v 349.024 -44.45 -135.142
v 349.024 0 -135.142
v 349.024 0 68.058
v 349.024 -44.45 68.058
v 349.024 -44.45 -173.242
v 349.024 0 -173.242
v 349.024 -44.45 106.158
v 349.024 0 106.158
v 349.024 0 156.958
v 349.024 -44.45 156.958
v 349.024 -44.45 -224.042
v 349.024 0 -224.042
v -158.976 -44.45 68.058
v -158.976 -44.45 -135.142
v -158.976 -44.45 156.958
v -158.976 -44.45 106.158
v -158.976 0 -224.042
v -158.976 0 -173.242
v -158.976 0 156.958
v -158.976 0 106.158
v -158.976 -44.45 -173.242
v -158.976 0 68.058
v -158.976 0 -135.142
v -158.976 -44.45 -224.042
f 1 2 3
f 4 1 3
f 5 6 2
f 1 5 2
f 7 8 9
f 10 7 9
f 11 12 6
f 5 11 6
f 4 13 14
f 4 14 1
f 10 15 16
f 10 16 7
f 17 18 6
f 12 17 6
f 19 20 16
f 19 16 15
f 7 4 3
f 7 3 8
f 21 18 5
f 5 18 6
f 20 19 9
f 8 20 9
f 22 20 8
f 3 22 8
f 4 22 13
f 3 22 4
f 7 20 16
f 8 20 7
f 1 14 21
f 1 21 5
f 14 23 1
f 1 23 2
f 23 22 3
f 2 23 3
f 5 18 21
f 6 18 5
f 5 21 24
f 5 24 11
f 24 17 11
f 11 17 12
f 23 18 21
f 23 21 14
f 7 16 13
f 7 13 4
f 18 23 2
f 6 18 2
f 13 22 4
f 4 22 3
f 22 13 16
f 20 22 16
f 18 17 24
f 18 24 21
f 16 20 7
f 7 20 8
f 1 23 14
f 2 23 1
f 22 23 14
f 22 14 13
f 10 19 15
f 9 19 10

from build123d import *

# Parameters (mm, degrees)
F0_W     = 508
F0_H     = 38.1
F1_DEPTH = 44.45
F2_DEPTH = 44.45
F0_H_2   = 203.2
F0_H_3   = 50.8
F3_DEPTH = 44.45


with BuildPart() as f1:
    # F0 (on Front) → F1 (new body)
    with BuildSketch(Plane.XZ):
        with Locations((95.023698, 87.108116)):
            Rectangle(F0_W, F0_H)
    extrude(amount=F1_DEPTH)


with BuildPart() as f2:
    # F0 (on Front) → F2 (new body)
    with BuildSketch(Plane.XZ):
        with Locations((95.023698, -154.191884)):
            Rectangle(F0_W, F0_H)
    extrude(amount=F2_DEPTH)


with BuildPart() as f3:
    # F0 (on Front) → F3 (new body)
    with BuildSketch(Plane.XZ):
        with Locations((95.023698, -33.541884)):
            Rectangle(F0_W, F0_H_2)
        with Locations((95.023698, 131.558116)):
            Rectangle(F0_W, F0_H_3)
        with Locations((95.023698, -198.641884)):
            Rectangle(F0_W, F0_H_3)
    extrude(amount=F3_DEPTH)


solid = Compound([f1.part, f2.part, f3.part])
